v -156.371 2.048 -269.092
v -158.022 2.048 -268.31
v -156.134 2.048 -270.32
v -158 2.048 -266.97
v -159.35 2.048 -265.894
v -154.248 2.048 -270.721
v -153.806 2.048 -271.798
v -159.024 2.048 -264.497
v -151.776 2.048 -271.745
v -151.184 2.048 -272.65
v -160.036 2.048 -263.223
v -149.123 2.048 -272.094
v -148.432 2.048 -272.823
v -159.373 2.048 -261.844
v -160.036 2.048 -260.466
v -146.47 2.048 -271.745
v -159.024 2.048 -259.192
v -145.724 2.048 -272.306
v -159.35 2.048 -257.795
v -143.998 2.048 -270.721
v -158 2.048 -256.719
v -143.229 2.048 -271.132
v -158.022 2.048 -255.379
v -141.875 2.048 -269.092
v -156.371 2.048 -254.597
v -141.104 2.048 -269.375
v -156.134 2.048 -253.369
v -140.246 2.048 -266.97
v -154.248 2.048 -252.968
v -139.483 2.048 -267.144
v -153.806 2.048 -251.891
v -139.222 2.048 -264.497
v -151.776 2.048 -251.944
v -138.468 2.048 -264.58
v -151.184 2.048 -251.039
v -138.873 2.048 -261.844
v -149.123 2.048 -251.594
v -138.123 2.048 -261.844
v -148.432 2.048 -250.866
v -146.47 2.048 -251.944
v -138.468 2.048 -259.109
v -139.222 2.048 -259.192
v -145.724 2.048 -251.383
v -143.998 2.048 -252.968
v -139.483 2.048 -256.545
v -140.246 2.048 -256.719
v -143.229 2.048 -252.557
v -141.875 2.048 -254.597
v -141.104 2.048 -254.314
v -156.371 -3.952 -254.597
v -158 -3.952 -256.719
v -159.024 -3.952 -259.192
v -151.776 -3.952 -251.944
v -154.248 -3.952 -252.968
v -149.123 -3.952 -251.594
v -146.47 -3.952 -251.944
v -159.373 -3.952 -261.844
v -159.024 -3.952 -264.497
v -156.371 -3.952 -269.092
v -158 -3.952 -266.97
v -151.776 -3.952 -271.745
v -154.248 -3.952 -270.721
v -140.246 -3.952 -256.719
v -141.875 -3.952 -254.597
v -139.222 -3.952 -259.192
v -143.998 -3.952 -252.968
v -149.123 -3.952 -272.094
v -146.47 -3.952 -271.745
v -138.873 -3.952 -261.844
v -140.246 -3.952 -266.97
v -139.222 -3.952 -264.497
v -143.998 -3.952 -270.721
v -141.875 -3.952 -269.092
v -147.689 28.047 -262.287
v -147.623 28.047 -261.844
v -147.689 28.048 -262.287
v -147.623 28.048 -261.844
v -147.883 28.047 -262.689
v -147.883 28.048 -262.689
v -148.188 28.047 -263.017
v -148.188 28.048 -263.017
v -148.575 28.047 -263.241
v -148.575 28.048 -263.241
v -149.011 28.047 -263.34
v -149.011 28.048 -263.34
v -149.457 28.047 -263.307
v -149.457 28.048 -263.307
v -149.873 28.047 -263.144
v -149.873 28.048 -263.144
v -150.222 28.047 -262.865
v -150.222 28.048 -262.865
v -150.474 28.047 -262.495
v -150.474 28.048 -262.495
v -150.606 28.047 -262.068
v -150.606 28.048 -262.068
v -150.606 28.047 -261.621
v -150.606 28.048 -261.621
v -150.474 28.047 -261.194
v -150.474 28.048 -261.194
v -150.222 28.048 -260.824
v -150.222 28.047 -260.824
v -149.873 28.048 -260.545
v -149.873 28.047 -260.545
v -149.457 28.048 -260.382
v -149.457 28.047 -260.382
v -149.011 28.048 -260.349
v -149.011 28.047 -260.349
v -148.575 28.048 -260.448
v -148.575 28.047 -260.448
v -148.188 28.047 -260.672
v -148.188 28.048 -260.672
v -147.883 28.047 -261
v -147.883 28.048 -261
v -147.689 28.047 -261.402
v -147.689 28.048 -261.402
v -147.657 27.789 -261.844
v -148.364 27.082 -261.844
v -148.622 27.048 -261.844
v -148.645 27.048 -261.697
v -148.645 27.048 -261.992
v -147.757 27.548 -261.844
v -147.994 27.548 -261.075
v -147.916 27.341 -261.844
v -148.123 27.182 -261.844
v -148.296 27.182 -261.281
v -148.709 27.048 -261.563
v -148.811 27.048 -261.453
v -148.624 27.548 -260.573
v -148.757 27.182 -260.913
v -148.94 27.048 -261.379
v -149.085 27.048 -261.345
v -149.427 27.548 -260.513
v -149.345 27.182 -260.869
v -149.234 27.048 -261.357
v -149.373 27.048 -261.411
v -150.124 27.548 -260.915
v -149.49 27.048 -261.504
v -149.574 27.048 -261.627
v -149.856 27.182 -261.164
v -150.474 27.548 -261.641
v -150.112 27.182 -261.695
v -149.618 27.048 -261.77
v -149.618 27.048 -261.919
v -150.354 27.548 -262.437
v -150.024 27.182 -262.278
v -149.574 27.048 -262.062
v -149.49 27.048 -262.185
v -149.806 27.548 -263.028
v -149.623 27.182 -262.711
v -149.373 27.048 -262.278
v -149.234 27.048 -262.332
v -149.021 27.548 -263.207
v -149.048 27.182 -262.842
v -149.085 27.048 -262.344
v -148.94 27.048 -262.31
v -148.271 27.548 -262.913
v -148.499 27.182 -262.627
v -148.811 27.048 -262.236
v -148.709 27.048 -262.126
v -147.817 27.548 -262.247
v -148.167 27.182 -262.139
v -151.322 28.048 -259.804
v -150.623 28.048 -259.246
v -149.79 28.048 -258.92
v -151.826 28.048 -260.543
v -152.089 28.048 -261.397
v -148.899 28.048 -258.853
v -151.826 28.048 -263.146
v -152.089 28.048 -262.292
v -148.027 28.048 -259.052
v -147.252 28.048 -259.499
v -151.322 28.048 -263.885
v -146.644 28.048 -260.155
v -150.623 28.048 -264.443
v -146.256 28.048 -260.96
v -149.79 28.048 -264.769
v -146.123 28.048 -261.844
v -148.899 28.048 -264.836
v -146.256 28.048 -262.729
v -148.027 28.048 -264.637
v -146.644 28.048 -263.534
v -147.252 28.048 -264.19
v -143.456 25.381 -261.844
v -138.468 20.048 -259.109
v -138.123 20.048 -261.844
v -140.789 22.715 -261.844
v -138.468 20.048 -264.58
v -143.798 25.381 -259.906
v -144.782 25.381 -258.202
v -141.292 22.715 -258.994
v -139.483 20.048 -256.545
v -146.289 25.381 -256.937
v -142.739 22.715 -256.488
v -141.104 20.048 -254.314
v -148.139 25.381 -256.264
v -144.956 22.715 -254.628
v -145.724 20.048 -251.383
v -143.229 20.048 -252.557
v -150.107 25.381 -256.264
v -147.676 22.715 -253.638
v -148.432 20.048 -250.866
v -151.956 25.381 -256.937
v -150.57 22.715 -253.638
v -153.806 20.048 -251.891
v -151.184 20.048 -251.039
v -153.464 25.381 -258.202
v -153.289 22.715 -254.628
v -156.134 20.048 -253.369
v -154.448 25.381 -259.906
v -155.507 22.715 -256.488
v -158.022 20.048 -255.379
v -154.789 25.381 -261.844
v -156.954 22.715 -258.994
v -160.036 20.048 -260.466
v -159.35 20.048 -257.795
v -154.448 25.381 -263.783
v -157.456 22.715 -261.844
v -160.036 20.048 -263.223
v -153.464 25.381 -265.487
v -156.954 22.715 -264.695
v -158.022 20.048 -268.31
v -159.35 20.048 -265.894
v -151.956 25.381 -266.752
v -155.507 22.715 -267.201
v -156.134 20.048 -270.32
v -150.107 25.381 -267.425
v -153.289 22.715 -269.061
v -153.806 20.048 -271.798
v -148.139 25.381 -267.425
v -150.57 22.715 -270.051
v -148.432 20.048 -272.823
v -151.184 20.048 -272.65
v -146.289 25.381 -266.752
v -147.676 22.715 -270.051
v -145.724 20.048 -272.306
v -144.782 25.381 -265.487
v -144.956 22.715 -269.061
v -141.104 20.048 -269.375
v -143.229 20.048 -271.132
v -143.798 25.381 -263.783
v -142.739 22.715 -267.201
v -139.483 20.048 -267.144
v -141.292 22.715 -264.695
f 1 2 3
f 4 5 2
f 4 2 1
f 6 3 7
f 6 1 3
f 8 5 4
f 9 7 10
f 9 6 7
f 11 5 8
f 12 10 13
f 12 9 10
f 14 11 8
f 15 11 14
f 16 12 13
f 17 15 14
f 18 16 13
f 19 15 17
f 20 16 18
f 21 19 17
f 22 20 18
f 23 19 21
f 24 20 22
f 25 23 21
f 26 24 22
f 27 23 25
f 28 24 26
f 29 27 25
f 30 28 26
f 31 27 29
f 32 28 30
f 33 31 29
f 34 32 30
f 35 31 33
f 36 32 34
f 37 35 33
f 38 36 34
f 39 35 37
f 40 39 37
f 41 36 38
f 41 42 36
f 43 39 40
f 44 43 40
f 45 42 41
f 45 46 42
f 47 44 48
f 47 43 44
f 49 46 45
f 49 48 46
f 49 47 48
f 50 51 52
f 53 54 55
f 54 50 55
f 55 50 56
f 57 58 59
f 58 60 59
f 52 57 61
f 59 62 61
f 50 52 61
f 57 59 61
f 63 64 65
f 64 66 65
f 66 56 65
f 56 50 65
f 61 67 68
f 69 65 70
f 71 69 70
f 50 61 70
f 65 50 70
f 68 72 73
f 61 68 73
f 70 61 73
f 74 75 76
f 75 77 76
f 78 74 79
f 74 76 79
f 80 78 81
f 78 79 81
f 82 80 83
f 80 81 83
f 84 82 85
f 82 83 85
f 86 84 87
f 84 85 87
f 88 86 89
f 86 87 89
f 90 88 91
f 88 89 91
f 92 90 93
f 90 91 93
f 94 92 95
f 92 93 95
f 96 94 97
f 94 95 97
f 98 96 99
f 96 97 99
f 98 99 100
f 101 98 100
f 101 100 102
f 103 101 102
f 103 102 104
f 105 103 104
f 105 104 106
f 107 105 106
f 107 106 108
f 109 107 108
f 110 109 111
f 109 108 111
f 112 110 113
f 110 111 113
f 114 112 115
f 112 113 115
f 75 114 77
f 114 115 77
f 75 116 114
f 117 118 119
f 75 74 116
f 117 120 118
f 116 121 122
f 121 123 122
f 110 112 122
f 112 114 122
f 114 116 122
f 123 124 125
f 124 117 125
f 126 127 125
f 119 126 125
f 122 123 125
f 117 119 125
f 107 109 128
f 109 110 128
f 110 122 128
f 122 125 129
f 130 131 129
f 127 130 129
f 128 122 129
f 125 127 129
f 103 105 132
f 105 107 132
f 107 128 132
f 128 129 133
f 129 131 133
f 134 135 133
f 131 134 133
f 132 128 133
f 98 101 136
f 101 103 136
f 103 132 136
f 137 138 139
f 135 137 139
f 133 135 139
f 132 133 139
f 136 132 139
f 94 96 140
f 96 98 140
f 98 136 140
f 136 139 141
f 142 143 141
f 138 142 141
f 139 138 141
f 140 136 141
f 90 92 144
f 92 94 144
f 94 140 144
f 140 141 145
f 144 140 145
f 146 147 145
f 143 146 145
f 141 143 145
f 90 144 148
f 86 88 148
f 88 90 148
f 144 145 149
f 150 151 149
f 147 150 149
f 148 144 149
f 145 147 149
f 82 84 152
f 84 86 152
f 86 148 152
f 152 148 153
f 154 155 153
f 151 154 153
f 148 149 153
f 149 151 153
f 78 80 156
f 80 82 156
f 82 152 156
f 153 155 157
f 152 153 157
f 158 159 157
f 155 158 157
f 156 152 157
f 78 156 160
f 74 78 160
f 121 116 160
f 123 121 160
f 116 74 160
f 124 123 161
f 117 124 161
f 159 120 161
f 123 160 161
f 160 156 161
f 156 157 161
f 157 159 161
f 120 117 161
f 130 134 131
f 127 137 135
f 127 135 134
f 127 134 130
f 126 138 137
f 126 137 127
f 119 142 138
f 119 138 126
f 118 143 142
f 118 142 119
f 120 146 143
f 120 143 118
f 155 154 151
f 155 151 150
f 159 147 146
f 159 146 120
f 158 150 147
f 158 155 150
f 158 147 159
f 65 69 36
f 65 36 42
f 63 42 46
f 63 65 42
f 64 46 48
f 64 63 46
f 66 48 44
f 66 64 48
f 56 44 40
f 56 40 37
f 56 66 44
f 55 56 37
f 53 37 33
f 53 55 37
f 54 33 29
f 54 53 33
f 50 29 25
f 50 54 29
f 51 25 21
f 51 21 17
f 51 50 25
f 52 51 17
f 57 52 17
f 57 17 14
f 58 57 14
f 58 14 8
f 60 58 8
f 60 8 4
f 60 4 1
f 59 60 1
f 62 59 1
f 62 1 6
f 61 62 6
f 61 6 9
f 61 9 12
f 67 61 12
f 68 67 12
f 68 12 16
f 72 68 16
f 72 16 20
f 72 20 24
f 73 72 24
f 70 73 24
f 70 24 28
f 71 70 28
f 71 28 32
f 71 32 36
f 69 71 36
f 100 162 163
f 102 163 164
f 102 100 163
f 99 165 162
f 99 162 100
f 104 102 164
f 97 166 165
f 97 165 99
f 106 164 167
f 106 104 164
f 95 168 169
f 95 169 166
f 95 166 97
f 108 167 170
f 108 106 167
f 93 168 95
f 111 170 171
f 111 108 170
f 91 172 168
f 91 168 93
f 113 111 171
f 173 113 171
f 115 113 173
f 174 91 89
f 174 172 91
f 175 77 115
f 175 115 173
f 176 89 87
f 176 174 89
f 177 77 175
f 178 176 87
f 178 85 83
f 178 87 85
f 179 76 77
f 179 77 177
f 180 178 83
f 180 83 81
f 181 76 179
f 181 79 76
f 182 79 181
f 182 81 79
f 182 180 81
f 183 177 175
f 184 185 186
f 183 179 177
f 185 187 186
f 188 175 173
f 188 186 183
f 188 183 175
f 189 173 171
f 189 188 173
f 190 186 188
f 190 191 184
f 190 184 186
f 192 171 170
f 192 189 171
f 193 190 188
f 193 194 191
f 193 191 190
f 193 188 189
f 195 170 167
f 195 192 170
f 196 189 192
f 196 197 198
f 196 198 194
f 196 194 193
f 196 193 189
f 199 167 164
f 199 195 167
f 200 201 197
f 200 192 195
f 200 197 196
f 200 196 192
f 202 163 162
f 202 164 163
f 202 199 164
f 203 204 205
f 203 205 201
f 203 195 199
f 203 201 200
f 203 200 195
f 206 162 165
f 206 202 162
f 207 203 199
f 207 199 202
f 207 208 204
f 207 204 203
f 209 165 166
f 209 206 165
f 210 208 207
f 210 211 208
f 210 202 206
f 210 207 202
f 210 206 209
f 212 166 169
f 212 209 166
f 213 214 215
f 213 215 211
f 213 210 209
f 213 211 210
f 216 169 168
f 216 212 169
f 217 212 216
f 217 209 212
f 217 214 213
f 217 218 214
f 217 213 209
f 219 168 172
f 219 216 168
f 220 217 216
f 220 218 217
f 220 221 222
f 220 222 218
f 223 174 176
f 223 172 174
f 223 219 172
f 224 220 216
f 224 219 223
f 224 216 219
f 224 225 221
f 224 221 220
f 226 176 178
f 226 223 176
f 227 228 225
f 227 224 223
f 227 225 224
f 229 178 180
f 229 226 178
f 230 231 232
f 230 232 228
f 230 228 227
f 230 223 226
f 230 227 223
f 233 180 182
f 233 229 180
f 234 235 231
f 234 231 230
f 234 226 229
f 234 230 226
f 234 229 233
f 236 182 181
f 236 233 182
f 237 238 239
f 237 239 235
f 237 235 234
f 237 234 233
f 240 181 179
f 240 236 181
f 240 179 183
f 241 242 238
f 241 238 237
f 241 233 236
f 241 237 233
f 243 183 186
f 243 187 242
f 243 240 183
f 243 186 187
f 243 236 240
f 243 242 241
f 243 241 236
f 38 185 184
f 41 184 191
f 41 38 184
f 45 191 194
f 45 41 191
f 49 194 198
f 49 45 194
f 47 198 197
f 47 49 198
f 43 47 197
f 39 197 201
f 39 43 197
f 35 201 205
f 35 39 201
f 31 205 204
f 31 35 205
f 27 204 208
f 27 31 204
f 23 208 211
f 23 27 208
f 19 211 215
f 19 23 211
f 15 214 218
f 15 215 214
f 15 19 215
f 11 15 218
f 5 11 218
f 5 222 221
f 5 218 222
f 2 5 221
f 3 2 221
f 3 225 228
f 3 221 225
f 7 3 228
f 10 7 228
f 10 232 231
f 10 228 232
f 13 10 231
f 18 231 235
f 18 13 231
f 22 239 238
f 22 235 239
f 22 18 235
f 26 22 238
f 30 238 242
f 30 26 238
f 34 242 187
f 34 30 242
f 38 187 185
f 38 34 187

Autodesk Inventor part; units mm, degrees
ref_plane "YZ Plane" through (0, 0, 0) normal (1, 0, 0) x (0, 1, 0)
ref_plane "XZ Plane" through (0, 0, 0) normal (0, 1, 0) x (-1, 0, 0)
ref_plane "XY Plane" through (0, 0, 0) normal (0, 0, 1) x (1, 0, 0)
ref_plane "Work Plane1" through (-149.1228, -3.9521, -261.8445) normal (0, 1, 0) x (1, 0, 0)
sketch "Sketch1" plane through (-149.1228, -3.9521, -261.8445) normal (0, 1, 0) x (1, 0, 0)
  circle A0 centre (0, 0) radius 11
  point P0 (149.1228, -261.8445)
  dimension "d0" = 22
extrude "Extrusion1" add sketch "Sketch1" along normal blind 32
sketch "Sketch2" plane through (-149.1228, 28.0479, -261.8445) normal (0, 1, 0) x (1, 0, 0)
  circle A0 centre (0, 0) radius 1
  point P0 (149.1228, -261.8445)
  dimension "d3" = 2
extrude "Extrusion2" [suppressed]
sketch "Sketch3" plane through (-149.1228, -3.9521, -261.8445) normal (0, -1, 0) x (1, 0, 0)
  circle A0 centre (0, 0) radius 11
  circle A1 centre (0, 0) radius 10.25
  point P0 (149.1228, 261.8445)
  dimension "d6" = 22
  dimension "d7" = 20.5
extrude "Extrusion3" cut sketch "Sketch3" against normal blind 6
chamfer "Chamfer1" distance 8 angle 45 1 edges at (-160.1228, 28.0479, -261.8445)
sketch "Sketch4" plane through (-149.1228, 28.0479, -261.8445) normal (0, 1, 0) x (1, 0, 0)
  circle A0 centre (0, 0) radius 11 projected
  circle A1 centre (0, 0) radius 1.5
  point P0 (149.1228, -261.8445)
  dimension "d13" = 3
extrude "Extrusion4" cut sketch "Sketch4" against normal blind 1 contours A1
fillet "Fillet1" radius 1 1 edges at (-150.6228, 27.0479, -261.8445)
properties part number "Objective_placeholder_V2"
